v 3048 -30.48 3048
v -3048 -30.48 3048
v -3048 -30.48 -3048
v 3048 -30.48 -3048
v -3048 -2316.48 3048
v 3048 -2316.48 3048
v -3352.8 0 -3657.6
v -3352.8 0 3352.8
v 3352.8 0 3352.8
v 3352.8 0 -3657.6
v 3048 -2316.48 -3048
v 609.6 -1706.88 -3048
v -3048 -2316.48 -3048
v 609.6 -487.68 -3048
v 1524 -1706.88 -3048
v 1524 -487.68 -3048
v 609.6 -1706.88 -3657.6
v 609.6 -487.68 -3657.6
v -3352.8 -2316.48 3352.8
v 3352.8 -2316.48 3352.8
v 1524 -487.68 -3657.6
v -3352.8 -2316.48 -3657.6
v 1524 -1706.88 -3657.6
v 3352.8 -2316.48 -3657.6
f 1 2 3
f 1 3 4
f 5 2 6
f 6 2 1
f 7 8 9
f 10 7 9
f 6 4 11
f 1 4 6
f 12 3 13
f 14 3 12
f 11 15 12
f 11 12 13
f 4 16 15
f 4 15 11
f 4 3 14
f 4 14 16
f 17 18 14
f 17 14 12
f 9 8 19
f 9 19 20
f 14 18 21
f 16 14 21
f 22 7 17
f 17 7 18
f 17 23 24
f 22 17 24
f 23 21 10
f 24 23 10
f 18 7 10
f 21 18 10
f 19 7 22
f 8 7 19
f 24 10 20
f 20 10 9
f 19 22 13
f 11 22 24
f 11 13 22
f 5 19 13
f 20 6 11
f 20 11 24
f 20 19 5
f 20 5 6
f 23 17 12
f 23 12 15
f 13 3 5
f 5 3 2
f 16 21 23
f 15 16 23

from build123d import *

# Parameters (mm, degrees)
F0_W     = 6705.6
F0_H     = 7010.4
F0_W_2   = 6096
F0_H_2   = 6096
F1_DEPTH = 2316.48
F2_DEPTH = 30.48
F5_W     = 914.4
F5_H     = 1219.2
F6_DEPTH = 609.6


# Not quite as in the source:
# - the program builds the solid bodies; features that only make, move or delete a surface that nothing else refers to are left out


with BuildPart() as f1:
    # F0 (on Front) → F1 (new body)
    with BuildSketch(Plane.XZ):
        with Locations((0, -152.4)):
            Rectangle(F0_W, F0_H)
        Rectangle(F0_W_2, F0_H_2, mode=Mode.SUBTRACT)
    extrude(amount=F1_DEPTH)

    # F0 (on Front) → F2 (join)
    with BuildSketch(Plane.XZ):
        Rectangle(F0_W_2, F0_H_2)
    extrude(amount=F2_DEPTH)

    # F5 (on face) → F6 (cut, through all)
    with BuildSketch(Plane(origin=(0, 0, -3657.6), x_dir=(1, 0, 0), z_dir=(0, 0, -1))):
        with Locations((1066.8, 1097.28)):
            Rectangle(F5_W, F5_H)
    extrude(amount=-F6_DEPTH, mode=Mode.SUBTRACT)


solid = f1.part
